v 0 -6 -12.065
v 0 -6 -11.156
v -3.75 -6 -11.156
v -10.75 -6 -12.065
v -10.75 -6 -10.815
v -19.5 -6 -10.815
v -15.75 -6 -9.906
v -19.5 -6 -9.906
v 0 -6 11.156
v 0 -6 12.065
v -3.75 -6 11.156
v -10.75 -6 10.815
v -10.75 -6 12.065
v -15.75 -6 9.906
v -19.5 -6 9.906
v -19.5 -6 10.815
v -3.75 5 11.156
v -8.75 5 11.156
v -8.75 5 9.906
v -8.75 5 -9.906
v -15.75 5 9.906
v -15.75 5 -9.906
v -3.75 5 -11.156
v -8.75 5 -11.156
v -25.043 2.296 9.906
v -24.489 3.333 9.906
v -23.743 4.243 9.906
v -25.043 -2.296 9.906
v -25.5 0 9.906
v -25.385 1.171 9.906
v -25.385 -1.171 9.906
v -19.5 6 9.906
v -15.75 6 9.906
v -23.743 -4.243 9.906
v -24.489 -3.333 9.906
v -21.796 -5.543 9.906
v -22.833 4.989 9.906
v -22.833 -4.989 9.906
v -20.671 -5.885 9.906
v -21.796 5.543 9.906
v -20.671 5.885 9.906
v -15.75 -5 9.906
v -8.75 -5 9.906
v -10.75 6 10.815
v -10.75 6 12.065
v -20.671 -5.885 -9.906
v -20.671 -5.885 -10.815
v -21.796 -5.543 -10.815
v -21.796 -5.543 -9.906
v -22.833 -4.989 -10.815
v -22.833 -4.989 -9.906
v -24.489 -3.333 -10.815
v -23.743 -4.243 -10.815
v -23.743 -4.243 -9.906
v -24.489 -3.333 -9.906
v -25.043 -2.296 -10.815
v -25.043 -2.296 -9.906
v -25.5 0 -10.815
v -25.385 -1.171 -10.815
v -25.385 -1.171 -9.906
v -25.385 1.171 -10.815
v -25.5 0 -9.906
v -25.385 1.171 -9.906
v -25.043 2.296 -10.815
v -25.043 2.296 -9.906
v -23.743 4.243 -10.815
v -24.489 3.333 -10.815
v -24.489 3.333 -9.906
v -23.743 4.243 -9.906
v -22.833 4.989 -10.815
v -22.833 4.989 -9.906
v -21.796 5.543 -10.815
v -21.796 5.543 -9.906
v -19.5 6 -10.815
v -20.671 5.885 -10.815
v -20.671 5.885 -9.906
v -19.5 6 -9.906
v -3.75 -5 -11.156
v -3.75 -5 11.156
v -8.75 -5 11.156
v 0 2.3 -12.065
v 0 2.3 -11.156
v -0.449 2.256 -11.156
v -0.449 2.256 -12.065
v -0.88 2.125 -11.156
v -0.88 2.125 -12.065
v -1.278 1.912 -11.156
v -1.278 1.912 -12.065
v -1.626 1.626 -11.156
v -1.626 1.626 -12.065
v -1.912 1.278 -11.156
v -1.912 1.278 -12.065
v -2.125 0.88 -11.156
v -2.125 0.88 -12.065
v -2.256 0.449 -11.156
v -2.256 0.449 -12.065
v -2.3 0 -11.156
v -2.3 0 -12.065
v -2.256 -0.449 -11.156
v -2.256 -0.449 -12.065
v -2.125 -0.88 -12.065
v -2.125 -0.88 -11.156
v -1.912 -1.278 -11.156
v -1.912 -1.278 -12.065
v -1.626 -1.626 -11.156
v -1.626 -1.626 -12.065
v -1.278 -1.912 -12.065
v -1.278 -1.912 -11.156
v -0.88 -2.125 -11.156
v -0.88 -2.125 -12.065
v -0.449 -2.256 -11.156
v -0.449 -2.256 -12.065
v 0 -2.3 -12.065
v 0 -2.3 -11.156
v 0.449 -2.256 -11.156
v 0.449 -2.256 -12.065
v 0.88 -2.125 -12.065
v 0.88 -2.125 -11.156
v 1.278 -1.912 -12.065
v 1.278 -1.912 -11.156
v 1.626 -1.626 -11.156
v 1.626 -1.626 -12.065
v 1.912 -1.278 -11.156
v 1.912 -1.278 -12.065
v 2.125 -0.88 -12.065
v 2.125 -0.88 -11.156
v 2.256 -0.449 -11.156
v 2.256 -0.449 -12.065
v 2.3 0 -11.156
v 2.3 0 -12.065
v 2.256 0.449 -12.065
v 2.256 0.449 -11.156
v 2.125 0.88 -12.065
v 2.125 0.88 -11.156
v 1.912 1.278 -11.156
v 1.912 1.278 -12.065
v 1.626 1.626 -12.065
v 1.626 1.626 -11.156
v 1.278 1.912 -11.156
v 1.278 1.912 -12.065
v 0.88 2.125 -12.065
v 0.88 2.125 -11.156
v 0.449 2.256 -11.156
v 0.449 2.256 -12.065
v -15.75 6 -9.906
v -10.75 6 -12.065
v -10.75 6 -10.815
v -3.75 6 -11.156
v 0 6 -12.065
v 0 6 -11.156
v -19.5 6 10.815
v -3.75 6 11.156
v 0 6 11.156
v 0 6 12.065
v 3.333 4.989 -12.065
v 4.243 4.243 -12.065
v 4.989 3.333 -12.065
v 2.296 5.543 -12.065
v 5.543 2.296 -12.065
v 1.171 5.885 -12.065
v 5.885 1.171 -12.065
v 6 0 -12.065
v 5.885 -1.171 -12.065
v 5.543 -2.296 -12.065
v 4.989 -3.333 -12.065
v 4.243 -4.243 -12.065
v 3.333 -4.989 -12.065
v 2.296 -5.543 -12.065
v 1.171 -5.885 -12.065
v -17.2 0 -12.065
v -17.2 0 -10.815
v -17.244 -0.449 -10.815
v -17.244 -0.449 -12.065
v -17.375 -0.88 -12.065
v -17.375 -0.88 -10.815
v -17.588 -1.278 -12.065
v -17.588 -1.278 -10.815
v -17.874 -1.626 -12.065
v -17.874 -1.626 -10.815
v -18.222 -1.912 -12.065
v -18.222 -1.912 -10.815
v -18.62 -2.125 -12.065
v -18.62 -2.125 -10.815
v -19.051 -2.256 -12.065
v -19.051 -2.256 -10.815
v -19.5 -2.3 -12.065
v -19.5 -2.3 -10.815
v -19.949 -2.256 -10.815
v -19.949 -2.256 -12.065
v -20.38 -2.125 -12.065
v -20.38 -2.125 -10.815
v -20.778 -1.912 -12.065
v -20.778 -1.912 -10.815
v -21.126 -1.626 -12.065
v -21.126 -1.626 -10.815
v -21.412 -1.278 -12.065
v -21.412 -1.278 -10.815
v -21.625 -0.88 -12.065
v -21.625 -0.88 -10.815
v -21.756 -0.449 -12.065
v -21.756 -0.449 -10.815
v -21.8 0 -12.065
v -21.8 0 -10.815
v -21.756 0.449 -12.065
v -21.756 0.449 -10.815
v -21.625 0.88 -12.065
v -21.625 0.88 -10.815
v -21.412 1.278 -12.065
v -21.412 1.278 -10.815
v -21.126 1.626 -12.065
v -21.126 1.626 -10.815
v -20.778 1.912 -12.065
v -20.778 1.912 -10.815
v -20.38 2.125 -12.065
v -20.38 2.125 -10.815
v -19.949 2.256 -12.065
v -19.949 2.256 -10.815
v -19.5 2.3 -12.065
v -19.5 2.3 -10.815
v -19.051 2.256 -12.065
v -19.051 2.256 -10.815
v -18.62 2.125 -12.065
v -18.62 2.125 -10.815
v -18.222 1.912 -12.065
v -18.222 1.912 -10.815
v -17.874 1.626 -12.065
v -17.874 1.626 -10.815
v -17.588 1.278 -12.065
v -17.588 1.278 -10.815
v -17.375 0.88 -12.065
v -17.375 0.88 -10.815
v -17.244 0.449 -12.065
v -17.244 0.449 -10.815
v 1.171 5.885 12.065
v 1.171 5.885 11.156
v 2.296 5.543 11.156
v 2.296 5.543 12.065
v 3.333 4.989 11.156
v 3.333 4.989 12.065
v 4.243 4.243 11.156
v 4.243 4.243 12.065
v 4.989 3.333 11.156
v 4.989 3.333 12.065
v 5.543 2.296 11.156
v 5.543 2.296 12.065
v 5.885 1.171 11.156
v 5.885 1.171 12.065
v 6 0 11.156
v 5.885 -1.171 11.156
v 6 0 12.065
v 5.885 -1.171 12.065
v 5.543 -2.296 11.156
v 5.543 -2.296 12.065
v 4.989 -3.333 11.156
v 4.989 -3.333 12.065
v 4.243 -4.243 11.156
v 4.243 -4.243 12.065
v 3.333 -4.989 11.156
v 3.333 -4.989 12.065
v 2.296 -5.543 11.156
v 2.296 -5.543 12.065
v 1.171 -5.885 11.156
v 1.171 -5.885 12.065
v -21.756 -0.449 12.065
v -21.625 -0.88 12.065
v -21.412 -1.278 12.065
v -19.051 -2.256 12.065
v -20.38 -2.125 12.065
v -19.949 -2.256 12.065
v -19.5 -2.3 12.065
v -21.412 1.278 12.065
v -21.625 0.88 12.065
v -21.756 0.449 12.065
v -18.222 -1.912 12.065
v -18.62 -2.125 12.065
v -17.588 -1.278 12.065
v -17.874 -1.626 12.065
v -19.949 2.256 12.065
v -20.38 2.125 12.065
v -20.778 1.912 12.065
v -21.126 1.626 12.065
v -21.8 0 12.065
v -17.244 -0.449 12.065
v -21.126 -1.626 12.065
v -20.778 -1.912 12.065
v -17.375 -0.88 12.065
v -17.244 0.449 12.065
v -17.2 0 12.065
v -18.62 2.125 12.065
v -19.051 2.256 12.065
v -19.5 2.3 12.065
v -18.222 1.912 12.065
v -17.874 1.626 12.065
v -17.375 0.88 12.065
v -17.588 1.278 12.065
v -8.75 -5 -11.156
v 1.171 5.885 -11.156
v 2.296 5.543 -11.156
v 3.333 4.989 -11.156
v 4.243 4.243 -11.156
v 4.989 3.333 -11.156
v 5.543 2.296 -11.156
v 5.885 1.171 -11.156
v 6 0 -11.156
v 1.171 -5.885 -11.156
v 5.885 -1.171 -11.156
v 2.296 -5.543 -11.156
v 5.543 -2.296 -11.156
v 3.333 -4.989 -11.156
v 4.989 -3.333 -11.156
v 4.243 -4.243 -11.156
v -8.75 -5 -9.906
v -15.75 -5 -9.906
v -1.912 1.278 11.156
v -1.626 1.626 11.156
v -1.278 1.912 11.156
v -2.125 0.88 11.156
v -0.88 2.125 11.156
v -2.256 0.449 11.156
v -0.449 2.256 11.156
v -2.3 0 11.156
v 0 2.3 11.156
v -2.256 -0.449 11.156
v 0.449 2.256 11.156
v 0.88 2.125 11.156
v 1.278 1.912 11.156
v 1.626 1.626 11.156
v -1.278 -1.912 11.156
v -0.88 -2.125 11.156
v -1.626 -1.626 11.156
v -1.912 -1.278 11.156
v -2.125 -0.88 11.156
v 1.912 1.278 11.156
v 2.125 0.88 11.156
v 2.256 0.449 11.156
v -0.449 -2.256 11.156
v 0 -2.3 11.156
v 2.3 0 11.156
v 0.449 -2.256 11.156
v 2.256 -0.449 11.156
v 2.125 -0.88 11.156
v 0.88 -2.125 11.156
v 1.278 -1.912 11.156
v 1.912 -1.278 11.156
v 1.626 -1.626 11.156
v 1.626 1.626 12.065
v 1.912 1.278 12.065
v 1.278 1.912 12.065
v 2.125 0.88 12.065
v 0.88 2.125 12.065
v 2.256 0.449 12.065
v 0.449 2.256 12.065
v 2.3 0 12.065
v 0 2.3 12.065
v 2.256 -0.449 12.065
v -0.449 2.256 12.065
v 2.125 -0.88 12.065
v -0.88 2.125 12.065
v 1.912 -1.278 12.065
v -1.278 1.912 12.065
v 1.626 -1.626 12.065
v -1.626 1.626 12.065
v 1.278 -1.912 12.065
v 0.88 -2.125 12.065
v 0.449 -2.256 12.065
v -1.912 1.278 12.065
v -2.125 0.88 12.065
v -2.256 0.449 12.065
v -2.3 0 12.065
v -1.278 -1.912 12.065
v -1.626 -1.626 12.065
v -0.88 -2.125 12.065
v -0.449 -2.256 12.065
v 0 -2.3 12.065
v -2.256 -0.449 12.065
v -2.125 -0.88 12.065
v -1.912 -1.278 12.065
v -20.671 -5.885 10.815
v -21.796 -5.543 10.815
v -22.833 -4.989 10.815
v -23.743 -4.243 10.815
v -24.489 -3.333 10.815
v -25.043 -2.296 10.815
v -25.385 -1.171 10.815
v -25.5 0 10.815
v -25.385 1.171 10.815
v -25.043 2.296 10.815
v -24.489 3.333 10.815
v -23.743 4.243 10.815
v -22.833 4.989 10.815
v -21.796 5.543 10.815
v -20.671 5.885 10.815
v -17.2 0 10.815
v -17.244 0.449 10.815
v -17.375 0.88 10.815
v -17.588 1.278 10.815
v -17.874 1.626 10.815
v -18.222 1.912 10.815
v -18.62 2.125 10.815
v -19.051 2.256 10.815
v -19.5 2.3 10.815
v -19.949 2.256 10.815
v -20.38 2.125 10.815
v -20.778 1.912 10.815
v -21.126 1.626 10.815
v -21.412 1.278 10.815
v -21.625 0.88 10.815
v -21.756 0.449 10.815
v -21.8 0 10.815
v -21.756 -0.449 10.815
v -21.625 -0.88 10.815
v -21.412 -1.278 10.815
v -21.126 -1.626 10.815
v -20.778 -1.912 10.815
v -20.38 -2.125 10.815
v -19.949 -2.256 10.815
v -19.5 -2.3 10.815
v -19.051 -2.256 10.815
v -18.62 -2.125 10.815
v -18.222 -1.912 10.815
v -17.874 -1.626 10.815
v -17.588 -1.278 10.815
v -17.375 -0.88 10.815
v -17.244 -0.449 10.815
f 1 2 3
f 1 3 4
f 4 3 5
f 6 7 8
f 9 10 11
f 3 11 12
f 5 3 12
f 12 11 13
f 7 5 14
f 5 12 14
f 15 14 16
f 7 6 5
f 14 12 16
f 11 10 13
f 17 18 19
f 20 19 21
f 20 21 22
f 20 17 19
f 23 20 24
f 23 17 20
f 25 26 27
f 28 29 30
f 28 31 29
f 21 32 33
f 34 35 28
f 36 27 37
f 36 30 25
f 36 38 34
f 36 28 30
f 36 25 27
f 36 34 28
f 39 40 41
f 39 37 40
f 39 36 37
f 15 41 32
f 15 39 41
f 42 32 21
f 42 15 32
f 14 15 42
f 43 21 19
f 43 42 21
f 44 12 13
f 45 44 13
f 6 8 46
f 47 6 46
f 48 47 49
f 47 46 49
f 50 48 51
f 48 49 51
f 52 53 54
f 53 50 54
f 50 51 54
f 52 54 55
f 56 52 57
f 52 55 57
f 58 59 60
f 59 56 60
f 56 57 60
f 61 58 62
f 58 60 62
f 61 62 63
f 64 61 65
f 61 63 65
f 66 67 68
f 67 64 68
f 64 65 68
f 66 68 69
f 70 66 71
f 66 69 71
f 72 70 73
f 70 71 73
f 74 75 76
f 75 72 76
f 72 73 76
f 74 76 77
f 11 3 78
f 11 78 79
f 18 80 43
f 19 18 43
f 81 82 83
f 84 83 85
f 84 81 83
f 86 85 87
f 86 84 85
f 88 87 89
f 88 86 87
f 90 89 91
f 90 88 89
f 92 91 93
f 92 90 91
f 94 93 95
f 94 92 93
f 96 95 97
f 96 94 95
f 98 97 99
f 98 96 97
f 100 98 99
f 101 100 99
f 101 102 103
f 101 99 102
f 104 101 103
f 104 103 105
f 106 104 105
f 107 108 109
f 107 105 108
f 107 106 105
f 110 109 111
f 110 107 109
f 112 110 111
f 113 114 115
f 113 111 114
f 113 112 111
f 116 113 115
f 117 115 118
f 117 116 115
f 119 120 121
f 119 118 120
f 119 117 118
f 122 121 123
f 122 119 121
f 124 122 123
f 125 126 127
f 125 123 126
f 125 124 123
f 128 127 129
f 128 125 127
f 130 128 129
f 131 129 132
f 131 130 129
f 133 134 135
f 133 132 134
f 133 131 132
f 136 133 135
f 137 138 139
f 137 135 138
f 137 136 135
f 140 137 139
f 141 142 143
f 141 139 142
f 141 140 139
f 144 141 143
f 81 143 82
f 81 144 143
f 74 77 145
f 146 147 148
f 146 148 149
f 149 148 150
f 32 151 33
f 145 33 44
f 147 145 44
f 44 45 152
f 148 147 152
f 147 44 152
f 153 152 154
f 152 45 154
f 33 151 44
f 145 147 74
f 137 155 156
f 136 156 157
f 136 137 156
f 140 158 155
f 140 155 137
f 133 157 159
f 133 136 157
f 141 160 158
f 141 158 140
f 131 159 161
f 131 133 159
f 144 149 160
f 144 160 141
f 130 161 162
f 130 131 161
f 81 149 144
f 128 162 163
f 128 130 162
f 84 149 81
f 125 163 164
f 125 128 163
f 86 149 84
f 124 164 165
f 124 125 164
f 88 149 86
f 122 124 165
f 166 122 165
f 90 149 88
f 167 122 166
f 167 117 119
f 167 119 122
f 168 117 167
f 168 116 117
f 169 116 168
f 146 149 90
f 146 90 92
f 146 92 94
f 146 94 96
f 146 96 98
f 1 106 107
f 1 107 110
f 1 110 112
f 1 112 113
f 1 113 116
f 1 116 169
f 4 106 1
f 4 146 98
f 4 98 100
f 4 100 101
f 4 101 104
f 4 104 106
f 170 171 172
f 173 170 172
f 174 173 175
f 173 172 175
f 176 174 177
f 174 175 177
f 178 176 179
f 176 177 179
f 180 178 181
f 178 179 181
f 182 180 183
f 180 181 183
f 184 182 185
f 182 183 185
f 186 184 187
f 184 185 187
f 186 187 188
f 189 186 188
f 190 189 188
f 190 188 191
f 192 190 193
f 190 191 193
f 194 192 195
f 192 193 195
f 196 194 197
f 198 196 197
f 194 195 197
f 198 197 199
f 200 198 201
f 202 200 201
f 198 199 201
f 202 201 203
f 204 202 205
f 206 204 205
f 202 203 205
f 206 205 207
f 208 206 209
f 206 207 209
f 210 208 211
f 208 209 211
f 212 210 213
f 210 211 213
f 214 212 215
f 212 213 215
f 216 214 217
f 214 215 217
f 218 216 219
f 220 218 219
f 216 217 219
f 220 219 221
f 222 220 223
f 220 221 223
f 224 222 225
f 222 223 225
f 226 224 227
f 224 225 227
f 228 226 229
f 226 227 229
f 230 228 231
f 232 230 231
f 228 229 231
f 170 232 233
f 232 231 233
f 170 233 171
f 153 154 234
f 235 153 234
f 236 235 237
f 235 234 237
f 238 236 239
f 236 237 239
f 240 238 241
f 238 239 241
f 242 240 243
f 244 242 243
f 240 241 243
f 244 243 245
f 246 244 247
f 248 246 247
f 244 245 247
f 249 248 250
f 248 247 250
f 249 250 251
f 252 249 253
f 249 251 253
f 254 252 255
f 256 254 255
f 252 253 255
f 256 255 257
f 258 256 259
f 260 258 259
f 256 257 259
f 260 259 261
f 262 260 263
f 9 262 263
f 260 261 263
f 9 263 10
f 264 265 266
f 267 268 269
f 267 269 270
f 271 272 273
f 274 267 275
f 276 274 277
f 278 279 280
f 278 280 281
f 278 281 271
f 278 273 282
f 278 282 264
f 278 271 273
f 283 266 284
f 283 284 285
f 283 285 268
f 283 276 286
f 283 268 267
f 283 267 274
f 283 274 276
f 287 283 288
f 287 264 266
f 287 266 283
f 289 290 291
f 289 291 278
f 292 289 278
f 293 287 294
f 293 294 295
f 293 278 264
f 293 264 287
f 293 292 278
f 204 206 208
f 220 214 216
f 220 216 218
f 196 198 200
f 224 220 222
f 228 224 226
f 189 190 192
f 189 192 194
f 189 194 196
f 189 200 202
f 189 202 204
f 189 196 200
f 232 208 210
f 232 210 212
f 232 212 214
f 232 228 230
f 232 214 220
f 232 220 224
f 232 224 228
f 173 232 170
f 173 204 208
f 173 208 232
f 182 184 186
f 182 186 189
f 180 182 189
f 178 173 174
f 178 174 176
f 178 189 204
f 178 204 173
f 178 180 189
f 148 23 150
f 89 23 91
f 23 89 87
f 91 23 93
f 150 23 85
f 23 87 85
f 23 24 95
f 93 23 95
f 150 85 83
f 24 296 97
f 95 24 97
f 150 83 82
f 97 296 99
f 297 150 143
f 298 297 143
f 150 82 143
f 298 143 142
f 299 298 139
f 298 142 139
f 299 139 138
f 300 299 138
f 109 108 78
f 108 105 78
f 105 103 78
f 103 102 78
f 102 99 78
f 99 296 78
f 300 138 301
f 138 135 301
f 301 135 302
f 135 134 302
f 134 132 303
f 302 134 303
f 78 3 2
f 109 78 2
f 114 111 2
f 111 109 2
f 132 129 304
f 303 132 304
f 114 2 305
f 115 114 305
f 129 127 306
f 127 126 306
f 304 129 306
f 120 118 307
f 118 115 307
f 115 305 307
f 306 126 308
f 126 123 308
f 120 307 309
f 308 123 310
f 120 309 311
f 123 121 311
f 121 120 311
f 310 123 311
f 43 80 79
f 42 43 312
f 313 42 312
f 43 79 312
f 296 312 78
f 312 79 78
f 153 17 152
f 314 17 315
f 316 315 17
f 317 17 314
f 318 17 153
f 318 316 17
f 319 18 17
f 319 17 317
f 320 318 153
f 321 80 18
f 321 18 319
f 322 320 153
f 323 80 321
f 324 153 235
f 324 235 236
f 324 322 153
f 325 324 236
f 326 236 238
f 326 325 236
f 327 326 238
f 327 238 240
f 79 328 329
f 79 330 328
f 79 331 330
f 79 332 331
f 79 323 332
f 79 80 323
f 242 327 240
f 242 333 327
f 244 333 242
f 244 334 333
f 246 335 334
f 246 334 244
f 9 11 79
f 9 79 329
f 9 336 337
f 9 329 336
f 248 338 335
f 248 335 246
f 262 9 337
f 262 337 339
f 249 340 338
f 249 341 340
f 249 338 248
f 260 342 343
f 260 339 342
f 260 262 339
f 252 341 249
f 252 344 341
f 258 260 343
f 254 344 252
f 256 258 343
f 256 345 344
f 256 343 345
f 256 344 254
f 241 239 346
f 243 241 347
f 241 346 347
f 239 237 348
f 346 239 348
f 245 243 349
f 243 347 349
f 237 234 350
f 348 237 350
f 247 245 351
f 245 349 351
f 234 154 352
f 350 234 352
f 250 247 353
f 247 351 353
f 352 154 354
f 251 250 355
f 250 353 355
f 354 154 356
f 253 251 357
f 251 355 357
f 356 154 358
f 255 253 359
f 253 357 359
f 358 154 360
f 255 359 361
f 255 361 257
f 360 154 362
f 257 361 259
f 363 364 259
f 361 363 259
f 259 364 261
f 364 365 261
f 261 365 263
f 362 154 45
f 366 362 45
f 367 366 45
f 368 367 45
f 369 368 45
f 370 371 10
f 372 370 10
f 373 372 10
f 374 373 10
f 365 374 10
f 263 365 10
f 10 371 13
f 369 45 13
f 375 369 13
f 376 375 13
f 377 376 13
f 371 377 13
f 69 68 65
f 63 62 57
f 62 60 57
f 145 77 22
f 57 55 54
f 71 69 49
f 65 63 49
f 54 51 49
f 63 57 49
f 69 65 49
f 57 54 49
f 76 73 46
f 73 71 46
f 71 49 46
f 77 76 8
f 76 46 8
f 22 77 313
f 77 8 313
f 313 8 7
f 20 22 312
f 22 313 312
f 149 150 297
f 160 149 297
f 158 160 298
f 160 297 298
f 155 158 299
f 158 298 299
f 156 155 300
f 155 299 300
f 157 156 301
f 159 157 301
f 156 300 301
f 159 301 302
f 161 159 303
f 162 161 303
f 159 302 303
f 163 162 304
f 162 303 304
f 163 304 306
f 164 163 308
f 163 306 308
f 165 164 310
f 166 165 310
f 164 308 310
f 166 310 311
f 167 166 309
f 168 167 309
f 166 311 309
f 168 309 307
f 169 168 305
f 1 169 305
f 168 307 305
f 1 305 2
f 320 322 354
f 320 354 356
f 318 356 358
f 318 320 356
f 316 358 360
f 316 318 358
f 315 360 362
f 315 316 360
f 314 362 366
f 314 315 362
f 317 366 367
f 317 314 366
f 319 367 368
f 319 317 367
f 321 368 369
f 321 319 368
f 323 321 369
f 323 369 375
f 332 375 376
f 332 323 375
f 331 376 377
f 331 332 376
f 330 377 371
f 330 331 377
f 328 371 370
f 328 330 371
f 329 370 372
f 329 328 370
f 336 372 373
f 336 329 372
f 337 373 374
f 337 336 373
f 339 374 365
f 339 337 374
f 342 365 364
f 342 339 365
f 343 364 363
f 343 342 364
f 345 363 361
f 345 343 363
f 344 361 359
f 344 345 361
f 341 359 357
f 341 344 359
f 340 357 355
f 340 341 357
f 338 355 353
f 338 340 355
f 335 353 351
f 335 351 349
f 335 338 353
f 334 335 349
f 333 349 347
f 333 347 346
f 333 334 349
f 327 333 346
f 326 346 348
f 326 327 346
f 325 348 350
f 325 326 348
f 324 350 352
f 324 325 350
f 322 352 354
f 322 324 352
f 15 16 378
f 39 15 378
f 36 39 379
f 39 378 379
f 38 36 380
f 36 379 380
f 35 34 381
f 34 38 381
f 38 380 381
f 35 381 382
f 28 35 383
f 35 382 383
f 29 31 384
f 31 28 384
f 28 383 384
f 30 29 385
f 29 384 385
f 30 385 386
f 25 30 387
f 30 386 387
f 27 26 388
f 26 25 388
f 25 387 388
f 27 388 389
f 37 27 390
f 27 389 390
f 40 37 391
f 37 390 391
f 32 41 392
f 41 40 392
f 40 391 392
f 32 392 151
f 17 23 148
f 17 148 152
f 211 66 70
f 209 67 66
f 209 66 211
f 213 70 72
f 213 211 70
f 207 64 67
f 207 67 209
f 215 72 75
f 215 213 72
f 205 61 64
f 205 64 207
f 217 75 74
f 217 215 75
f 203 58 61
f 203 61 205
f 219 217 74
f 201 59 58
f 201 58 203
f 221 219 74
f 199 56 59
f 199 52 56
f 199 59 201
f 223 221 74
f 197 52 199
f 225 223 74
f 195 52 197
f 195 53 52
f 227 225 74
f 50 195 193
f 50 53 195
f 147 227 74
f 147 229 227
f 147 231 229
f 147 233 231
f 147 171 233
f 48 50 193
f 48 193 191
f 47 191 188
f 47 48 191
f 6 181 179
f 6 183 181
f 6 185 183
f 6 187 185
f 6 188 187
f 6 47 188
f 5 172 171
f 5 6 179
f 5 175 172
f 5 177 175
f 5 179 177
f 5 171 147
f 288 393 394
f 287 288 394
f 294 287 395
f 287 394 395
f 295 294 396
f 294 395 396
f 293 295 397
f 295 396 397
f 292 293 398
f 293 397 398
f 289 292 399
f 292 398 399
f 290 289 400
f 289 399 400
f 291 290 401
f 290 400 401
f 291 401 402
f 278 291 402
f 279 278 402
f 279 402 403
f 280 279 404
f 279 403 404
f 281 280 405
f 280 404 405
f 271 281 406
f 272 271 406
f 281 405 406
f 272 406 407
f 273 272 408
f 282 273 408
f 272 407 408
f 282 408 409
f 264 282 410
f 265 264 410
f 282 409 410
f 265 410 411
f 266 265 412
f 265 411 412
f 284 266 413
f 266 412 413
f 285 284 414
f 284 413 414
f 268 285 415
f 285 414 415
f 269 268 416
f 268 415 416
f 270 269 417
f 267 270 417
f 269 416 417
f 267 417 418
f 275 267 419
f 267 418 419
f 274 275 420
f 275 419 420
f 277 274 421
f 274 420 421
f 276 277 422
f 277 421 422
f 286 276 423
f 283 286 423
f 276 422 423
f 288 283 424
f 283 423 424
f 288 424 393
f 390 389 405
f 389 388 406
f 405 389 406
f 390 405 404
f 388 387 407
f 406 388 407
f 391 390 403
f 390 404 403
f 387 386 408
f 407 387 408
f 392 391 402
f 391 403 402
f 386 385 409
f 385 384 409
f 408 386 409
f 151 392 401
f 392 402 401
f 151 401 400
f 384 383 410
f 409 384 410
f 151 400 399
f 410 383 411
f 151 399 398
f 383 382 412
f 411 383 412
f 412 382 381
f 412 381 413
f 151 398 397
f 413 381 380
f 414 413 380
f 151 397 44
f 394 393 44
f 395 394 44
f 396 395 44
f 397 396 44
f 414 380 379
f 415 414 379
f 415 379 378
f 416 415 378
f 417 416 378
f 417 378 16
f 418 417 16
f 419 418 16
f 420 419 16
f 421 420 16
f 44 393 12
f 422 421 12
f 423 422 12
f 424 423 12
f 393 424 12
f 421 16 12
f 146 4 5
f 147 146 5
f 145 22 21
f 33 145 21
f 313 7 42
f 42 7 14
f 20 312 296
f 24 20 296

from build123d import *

# Parameters (mm, degrees)
SKETCH1_R           = 2.2999954
BOSS_EXTRUDE1_DEPTH = 12.065
SKETCH2_W           = 9.75
SKETCH2_H           = 22.312
SKETCH2_W_2         = 14.75
SKETCH2_H_2         = 1.25
SKETCH2_H_3         = 19.812
CUT_EXTRUDE1_DEPTH  = 13
SKETCH3_R           = 2.2999954
BOSS_EXTRUDE2_DEPTH = 1.25
SKETCH4_R           = 2.2999954
BOSS_EXTRUDE3_DEPTH = 1.25
SKETCH5_W           = 19.812
SKETCH5_H           = 10
CUT_EXTRUDE2_DEPTH  = 22.75
SKETCH6_W           = 1.25
SKETCH6_H           = 10
CUT_EXTRUDE3_DEPTH  = 5


with BuildPart() as part:
    # Sketch1 → Boss-Extrude1 (new body, symmetric)
    with BuildSketch(Plane(origin=(0, 0, 0), x_dir=(0, 1, 0), z_dir=(0, 0, 1))):
        with BuildLine():
            Line((-6, 0), (-6, 19.5))
            ThreePointArc((-6, 19.5), (0, 25.5), (6, 19.5))
            Line((6, 19.5), (6, 0))
            ThreePointArc((6, 0), (0, -6), (-6, 0))
        make_face()
        Circle(SKETCH1_R, mode=Mode.SUBTRACT)
    extrude(amount=BOSS_EXTRUDE1_DEPTH, both=True)

    # Sketch2 → Cut-Extrude1 (cut, through all)
    with BuildSketch(Plane.XZ.offset(6)):
        with Locations((1.125, 0)):
            Rectangle(SKETCH2_W, SKETCH2_H)
        with Locations((-18.125, 11.44)):
            Rectangle(SKETCH2_W_2, SKETCH2_H_2)
        with Locations((-18.125, -11.44)):
            Rectangle(SKETCH2_W_2, SKETCH2_H_2)
        with Locations((-20.625, 0)):
            Rectangle(SKETCH2_W, SKETCH2_H_3)
    extrude(amount=-CUT_EXTRUDE1_DEPTH, mode=Mode.SUBTRACT)

    # Sketch3 → Boss-Extrude2 (add)
    with BuildSketch(Plane.XY.offset(10.815)):
        with Locations((-19.5, 0)):
            Circle(SKETCH3_R)
    extrude(amount=BOSS_EXTRUDE2_DEPTH)

    # Sketch4 → Boss-Extrude3 (add)
    with BuildSketch(Plane(origin=(0, 0, -10.815), x_dir=(1, 0, 0), z_dir=(0, 0, -1))):
        with Locations((-19.5, 0)):
            Circle(SKETCH4_R)
    extrude(amount=BOSS_EXTRUDE3_DEPTH)

    # Sketch5 → Cut-Extrude2 (cut, through all)
    with BuildSketch(Plane(origin=(-3.75, 0, 0), x_dir=(0, 0, -1), z_dir=(1, 0, 0))):
        Rectangle(SKETCH5_W, SKETCH5_H)
    extrude(amount=-CUT_EXTRUDE2_DEPTH, mode=Mode.SUBTRACT)

    # Sketch6 → Cut-Extrude3 (cut)
    with BuildSketch(Plane(origin=(-3.75, 0, 0), x_dir=(0, 0, -1), z_dir=(1, 0, 0))):
        with Locations((-10.531, 0)):
            Rectangle(SKETCH6_W, SKETCH6_H)
        with Locations((10.531, 0)):
            Rectangle(SKETCH6_W, SKETCH6_H)
    extrude(amount=-CUT_EXTRUDE3_DEPTH, mode=Mode.SUBTRACT)


solid = part.part
